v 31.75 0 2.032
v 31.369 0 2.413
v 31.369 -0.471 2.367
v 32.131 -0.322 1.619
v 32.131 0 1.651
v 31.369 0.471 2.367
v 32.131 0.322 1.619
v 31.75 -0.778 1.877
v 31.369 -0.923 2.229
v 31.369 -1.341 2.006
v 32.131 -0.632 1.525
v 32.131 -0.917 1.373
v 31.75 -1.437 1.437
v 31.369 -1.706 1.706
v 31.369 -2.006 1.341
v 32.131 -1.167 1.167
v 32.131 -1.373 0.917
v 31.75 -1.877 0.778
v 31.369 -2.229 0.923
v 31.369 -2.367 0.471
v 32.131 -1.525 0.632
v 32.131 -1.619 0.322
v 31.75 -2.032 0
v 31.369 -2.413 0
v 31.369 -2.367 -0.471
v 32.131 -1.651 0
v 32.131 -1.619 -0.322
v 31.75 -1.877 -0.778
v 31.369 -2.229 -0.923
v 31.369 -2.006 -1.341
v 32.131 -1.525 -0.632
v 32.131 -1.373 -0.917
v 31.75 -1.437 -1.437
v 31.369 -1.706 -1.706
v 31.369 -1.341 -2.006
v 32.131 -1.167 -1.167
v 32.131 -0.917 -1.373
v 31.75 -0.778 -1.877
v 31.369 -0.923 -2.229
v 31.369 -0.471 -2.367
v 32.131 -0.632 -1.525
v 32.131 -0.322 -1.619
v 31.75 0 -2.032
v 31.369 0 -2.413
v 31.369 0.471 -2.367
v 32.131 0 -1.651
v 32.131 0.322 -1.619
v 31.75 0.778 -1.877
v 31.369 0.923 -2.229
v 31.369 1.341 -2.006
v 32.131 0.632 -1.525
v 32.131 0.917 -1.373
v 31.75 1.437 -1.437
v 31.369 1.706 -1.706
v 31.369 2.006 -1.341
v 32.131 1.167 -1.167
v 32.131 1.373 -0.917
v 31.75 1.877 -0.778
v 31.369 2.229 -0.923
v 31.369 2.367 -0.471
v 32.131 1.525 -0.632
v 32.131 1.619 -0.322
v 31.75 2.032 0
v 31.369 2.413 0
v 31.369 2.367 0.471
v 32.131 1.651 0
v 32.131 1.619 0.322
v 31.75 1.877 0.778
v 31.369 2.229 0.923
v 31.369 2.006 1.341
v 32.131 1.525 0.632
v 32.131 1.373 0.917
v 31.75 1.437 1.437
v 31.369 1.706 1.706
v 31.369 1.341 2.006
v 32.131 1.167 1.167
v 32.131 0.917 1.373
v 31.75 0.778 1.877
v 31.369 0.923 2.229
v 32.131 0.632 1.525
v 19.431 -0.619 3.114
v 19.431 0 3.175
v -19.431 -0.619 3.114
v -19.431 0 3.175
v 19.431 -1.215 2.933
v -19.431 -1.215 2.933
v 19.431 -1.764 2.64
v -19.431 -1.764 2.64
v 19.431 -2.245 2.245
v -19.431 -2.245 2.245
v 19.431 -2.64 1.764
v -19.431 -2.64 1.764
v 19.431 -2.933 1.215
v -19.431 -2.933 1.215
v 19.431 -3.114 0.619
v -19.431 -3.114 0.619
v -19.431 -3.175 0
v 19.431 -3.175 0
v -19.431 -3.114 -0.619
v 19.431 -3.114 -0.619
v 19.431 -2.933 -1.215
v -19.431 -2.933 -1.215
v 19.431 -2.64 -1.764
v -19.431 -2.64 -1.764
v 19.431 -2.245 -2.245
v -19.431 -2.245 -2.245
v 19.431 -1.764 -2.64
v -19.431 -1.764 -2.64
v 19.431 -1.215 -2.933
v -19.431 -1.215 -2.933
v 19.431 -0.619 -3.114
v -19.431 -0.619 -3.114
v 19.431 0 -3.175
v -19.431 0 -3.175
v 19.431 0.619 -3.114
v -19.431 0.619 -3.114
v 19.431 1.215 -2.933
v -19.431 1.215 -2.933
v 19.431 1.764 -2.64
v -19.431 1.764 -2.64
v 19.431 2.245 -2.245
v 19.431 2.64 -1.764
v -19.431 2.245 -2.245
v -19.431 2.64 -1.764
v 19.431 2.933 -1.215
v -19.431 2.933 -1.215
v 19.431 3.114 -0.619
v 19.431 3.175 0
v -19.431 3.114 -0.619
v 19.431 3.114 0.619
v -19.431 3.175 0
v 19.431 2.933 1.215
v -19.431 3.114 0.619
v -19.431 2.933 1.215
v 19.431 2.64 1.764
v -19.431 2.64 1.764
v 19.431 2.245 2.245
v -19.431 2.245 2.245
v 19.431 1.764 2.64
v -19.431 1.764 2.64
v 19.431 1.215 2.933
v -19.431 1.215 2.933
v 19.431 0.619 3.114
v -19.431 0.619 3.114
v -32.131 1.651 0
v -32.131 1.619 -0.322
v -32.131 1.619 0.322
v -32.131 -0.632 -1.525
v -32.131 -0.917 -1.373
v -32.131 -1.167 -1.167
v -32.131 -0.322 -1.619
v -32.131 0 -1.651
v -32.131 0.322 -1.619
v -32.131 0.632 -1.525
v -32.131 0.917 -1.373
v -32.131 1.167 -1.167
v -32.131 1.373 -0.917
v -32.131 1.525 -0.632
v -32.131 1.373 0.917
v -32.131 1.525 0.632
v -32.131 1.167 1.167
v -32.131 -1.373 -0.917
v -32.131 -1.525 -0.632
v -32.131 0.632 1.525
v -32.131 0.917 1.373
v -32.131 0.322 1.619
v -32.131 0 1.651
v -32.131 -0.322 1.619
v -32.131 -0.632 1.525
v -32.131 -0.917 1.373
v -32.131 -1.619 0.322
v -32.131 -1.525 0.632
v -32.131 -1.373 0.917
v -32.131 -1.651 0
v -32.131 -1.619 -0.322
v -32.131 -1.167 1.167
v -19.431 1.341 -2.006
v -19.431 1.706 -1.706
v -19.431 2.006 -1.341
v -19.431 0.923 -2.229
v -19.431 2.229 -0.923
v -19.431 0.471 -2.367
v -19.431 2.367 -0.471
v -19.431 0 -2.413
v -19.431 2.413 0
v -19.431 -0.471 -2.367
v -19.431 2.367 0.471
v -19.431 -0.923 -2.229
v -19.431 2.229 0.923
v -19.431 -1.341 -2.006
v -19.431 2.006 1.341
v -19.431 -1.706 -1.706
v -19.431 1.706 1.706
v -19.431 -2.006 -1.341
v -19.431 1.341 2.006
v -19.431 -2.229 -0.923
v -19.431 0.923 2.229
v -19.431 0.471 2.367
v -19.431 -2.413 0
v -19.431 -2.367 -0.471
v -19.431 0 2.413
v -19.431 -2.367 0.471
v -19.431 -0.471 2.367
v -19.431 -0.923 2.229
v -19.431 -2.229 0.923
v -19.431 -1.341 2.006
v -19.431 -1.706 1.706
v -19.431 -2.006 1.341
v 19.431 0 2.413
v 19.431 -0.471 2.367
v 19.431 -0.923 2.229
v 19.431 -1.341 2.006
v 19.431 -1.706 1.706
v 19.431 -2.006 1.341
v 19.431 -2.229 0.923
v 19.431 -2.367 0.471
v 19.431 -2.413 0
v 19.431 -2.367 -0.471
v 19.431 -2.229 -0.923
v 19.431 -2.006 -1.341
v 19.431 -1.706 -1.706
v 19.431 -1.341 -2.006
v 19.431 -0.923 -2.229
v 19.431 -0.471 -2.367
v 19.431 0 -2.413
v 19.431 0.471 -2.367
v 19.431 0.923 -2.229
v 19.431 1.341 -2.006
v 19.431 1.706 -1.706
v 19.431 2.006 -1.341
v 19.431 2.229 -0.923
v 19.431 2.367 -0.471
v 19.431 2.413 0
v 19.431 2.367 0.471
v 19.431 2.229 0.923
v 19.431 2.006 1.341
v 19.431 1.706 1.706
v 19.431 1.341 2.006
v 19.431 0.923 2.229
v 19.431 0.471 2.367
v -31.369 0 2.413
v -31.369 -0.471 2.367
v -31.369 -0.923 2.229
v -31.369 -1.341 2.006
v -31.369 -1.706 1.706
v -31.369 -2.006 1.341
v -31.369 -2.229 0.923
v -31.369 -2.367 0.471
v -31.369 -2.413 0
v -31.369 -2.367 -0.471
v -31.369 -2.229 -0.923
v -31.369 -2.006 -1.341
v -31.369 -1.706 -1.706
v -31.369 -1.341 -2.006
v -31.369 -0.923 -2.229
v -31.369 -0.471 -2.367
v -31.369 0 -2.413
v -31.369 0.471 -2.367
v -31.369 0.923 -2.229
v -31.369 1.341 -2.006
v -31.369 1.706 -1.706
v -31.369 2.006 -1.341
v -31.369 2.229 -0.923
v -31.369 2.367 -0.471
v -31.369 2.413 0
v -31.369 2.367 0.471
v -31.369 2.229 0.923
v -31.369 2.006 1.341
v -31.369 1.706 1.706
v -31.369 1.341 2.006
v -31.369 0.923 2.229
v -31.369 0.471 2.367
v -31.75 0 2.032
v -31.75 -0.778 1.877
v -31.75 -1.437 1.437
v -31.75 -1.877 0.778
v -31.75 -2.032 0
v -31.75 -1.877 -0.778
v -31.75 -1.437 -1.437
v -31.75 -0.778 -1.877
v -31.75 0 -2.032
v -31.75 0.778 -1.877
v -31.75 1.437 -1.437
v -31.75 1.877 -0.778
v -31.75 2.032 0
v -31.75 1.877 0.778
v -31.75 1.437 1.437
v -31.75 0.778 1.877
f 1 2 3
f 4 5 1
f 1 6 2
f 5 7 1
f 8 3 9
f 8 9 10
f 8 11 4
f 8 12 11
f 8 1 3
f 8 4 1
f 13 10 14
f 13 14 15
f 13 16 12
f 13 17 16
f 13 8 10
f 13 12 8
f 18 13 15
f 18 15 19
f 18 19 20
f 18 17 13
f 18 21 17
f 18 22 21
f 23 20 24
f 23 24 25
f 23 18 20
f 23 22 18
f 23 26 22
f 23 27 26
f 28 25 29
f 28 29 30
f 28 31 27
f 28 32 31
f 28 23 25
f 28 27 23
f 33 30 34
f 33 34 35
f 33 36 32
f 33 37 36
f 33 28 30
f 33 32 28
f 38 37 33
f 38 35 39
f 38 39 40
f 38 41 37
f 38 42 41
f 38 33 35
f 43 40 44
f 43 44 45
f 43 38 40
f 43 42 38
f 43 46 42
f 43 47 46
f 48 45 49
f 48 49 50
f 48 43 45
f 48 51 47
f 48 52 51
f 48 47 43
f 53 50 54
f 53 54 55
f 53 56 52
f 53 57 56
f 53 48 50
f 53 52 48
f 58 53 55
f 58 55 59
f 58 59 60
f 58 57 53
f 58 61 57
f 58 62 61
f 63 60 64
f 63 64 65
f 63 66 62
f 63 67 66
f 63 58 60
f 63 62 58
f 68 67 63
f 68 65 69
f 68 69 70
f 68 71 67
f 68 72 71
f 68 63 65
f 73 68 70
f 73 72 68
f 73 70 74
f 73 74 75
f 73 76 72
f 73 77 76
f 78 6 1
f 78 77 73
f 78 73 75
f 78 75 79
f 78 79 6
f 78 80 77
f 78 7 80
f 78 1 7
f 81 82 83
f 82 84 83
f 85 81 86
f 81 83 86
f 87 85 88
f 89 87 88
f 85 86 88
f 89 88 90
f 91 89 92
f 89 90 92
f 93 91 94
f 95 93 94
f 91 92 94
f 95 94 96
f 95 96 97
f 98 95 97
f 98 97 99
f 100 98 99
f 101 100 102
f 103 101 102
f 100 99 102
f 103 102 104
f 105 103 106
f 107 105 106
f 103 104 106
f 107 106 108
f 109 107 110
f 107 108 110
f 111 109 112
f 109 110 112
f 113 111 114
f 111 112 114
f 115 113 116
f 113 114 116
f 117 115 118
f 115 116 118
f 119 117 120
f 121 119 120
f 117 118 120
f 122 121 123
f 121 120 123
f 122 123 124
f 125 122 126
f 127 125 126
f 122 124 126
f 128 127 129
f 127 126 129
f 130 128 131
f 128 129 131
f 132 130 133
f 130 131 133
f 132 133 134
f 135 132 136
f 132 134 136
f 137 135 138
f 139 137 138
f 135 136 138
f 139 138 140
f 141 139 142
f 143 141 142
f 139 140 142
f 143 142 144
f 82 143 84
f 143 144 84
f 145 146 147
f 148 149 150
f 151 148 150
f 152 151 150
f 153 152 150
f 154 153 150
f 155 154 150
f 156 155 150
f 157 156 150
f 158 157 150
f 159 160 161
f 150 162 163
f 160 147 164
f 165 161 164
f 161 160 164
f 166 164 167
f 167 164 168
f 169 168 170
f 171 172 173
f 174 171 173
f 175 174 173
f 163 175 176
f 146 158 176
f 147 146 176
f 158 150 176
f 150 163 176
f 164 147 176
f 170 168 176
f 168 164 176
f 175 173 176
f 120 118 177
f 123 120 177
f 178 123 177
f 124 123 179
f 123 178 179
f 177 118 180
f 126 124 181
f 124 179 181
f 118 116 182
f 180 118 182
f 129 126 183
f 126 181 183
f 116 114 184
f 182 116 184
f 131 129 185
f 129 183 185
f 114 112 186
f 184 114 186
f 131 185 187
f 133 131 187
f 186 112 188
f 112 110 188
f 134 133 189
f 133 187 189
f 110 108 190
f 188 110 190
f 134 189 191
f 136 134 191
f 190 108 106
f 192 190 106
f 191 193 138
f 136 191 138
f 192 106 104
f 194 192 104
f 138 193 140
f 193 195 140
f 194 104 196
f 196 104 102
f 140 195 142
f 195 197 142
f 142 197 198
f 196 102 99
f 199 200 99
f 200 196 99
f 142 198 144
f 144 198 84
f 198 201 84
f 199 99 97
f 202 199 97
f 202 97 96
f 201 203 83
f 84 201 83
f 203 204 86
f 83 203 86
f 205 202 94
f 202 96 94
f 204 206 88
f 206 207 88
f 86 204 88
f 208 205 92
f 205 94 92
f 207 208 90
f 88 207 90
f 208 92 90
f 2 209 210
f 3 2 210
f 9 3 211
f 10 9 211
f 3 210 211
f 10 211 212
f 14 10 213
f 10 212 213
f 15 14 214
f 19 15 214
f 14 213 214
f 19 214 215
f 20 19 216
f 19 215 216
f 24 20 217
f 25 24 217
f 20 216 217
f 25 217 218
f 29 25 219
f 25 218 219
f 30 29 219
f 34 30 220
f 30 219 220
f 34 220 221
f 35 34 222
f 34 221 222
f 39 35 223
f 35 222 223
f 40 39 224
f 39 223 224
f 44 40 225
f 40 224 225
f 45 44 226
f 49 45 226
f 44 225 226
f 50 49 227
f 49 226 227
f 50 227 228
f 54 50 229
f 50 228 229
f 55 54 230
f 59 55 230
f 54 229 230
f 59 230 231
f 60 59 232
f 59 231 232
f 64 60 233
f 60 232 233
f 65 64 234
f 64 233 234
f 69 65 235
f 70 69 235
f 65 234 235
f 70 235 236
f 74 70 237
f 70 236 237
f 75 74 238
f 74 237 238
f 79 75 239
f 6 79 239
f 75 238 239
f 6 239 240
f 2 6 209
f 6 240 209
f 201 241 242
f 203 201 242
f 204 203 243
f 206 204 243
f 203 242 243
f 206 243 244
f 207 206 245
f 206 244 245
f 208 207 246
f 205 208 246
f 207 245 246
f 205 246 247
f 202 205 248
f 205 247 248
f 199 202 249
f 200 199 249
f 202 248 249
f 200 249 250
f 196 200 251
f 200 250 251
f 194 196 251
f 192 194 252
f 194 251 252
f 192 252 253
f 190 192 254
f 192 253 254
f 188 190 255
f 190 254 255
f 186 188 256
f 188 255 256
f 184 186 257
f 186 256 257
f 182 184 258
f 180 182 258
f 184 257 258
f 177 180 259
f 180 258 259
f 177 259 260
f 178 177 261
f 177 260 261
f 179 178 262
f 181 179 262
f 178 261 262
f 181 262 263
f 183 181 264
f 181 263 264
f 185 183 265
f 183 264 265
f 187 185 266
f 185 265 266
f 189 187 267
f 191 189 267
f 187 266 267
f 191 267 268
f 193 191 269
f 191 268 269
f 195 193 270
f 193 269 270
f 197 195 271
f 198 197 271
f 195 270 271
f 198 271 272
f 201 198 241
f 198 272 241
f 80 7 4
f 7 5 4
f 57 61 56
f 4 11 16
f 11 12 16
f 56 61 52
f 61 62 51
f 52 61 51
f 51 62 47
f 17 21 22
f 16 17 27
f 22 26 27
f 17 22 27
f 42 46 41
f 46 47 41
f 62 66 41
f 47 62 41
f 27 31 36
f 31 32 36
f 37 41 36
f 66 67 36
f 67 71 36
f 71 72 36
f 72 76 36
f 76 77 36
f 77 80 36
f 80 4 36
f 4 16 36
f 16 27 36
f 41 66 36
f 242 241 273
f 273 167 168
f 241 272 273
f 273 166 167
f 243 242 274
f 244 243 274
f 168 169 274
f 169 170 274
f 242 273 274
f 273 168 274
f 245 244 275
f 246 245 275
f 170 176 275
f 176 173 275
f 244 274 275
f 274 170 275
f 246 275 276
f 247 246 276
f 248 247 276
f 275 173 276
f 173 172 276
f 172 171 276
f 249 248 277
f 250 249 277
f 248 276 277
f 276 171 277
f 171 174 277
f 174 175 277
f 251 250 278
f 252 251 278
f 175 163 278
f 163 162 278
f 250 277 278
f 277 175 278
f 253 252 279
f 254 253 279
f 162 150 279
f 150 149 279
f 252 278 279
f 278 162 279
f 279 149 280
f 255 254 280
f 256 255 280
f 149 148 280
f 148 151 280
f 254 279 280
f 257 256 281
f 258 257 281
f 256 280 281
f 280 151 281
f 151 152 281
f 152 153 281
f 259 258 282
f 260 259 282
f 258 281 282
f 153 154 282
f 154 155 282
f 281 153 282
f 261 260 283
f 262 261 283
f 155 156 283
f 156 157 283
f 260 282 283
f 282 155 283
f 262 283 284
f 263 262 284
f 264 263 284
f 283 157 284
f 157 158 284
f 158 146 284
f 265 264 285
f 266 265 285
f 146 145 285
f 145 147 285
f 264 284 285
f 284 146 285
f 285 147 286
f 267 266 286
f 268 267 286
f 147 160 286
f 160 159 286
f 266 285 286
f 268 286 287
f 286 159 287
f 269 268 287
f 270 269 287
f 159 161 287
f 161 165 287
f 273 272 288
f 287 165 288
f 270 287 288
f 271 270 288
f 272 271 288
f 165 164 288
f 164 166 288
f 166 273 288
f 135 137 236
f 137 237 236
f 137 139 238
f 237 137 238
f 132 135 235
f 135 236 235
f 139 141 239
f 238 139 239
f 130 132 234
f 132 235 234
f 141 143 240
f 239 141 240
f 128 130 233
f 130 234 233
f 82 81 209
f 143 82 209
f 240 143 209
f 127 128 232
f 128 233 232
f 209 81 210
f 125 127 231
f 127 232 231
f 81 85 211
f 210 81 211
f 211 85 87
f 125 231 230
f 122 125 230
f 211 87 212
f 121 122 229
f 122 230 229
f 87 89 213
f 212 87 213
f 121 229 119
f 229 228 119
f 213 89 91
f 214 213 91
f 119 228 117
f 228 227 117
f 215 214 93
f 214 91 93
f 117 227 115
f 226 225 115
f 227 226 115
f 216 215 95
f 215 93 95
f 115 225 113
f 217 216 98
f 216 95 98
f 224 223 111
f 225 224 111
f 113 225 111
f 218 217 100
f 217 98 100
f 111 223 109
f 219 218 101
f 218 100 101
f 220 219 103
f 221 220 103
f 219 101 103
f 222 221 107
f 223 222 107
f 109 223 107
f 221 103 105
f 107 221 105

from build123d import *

# Parameters (mm, degrees)
CHAMFER1_SIZE = 0.762
CHAMFER2_SIZE = 0.762


with BuildPart() as part:
    # Sketch3 → Revolve1 (revolve)
    with BuildSketch(Plane.XY, mode=Mode.PRIVATE) as revolve1_sk:
        Polygon((-32.131, 0), (32.131, 0), (32.131, 2.413), (19.431, 2.413), (19.431, 3.175), (-19.431, 3.175), (-19.431, 2.413), (-32.131, 2.413), align=None)
    revolve(revolve1_sk.sketch.rotate(Axis((-32.131, 0, 0), (1, 0, 0)), 90), axis=Axis((-32.131, 0, 0), (1, 0, 0)))

    # Chamfer1
    chamfer1_edges = [part.edges().sort_by_distance(p)[0] for p in [
        (-32.131, 0, -2.413),
    ]]
    chamfer(chamfer1_edges, length=CHAMFER1_SIZE)

    # Chamfer2
    chamfer2_edges = [part.edges().sort_by_distance(p)[0] for p in [
        (32.131, 0, -2.413),
    ]]
    chamfer(chamfer2_edges, length=CHAMFER2_SIZE)


solid = part.part
